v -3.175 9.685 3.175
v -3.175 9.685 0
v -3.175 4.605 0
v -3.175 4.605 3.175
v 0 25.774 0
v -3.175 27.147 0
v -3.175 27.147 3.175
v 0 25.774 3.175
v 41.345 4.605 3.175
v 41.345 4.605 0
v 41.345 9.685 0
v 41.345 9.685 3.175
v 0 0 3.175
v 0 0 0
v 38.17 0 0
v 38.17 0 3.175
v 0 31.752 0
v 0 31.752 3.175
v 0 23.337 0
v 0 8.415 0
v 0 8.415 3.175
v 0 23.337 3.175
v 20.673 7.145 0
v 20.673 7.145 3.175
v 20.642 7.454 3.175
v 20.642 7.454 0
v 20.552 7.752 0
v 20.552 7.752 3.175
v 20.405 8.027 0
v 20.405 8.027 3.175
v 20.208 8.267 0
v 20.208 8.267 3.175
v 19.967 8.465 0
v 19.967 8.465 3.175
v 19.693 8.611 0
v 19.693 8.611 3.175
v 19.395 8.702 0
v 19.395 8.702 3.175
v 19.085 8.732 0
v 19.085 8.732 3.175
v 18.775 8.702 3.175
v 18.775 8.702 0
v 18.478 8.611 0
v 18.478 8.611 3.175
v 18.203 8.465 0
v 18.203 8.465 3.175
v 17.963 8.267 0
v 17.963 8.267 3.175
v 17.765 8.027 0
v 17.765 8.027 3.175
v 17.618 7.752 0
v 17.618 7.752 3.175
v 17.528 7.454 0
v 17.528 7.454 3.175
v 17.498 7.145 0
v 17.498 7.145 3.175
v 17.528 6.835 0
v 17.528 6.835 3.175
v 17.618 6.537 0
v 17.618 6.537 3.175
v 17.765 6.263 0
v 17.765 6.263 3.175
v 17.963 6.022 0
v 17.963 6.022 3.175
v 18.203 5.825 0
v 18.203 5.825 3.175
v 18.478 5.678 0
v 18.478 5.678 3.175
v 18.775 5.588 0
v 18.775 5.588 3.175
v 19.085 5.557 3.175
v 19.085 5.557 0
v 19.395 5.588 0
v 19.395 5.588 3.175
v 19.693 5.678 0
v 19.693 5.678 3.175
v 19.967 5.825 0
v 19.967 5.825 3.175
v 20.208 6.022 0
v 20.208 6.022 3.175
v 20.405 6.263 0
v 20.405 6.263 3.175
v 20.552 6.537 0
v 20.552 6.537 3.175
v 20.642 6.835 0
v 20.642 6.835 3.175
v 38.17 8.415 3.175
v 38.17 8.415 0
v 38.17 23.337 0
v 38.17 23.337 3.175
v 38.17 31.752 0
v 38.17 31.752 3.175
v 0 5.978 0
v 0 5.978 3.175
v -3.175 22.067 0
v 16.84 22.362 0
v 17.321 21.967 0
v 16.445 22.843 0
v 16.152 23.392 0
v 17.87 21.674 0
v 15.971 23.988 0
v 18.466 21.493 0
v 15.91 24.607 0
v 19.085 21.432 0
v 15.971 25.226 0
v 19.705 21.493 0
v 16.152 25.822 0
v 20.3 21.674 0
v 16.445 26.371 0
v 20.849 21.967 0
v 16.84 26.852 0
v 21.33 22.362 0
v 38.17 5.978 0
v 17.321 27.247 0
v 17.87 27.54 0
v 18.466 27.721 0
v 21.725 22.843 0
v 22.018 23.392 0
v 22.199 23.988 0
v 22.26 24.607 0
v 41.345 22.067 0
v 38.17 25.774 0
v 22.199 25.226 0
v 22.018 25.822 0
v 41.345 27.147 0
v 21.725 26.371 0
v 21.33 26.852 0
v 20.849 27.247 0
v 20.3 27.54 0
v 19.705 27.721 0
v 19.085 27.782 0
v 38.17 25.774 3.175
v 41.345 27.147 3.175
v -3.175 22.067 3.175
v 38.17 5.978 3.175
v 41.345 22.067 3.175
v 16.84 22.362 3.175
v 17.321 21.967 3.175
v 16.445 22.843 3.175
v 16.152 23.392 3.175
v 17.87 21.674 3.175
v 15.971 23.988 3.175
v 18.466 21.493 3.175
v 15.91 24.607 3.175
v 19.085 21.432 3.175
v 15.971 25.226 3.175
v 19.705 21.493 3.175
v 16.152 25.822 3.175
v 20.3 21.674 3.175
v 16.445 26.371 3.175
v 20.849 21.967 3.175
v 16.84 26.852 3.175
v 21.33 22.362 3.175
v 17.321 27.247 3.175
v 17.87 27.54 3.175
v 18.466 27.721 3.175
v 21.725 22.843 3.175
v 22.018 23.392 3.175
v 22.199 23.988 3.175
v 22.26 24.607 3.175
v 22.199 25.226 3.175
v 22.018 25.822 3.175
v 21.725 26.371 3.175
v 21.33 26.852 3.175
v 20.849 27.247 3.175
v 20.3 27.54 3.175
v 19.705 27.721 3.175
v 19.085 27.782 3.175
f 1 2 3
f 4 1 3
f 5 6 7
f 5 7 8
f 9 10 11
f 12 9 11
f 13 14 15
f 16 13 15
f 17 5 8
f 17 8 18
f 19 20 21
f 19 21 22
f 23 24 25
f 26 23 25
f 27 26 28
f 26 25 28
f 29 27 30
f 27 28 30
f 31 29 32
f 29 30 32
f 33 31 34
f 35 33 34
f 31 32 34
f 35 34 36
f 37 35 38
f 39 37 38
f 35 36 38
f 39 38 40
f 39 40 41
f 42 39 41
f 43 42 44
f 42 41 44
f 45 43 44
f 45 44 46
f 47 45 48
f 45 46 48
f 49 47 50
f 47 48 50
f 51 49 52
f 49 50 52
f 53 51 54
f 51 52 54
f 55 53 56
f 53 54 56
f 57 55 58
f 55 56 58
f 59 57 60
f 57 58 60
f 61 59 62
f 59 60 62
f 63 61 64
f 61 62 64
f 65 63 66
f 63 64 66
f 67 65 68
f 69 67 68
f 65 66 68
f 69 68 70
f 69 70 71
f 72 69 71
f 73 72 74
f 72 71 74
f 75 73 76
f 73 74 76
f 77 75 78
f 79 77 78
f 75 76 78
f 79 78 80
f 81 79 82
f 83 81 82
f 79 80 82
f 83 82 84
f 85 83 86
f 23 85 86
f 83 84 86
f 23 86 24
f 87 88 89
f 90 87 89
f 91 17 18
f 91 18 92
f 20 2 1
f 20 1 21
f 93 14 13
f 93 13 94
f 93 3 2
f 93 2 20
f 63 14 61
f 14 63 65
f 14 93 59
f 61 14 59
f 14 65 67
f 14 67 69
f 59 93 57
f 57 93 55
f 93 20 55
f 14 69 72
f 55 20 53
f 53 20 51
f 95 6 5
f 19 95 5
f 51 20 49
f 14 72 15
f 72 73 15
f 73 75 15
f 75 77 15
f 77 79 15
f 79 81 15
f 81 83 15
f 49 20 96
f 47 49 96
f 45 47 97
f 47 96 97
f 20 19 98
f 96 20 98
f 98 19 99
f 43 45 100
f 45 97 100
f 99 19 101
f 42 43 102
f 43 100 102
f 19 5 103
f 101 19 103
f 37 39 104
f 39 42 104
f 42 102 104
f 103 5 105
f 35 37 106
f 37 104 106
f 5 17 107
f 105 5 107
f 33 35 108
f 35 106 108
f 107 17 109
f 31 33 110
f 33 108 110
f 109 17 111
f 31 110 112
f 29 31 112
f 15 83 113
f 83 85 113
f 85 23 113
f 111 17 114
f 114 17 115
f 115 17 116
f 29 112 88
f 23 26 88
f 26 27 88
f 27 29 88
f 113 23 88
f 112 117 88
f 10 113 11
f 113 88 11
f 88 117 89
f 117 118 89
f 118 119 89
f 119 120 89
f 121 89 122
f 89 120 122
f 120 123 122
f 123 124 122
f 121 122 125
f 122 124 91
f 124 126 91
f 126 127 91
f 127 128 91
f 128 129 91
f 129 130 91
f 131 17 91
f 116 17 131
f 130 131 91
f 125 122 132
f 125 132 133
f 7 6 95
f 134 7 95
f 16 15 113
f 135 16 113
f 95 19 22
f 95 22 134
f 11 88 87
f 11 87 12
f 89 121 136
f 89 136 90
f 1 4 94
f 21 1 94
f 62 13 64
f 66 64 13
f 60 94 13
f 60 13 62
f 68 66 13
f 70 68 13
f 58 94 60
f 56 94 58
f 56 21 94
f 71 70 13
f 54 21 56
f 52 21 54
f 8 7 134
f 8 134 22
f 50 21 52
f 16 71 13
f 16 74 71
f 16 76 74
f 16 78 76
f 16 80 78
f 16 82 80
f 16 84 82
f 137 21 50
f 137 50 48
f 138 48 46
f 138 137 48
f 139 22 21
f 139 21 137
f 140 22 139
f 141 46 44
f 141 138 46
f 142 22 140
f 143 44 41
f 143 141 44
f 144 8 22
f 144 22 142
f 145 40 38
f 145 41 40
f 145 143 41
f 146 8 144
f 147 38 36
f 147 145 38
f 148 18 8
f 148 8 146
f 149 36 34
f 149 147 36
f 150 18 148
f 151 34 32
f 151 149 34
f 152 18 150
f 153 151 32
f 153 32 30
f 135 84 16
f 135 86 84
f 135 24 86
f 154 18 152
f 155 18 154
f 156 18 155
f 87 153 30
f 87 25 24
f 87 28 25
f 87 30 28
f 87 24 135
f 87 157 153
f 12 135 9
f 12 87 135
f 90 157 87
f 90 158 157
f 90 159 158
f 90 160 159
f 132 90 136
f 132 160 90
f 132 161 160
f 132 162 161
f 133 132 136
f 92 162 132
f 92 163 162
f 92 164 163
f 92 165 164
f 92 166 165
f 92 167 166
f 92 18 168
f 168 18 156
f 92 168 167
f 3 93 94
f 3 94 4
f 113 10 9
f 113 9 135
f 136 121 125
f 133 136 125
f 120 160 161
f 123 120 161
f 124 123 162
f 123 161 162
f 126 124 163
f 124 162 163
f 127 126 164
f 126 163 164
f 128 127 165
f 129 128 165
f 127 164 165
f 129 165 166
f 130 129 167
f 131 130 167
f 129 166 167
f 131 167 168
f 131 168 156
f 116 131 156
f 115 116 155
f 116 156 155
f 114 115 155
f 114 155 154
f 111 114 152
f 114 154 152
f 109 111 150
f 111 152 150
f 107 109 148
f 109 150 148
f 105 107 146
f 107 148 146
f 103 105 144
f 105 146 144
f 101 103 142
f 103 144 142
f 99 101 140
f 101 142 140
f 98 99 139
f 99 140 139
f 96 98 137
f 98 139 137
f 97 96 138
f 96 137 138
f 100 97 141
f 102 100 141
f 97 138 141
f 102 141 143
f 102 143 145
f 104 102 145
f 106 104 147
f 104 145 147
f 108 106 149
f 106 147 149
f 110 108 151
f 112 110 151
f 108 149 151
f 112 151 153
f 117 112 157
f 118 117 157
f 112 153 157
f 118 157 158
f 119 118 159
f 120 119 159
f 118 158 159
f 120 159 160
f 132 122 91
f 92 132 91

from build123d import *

# Parameters (mm, degrees)
SKETCH1_W           = 38.170316933
SKETCH1_H           = 31.751666379
BOSS_EXTRUDE1_DEPTH = 3.175
SKETCH2_R           = 3.175
SKETCH2_R_2         = 1.5875
CUT_EXTRUDE1_DEPTH  = 3.175


with BuildPart() as part:
    # Sketch1 → Boss-Extrude1 (new body)
    with BuildSketch(Plane.XY):
        with Locations((19.085158467, 15.87583319)):
            Rectangle(SKETCH1_W, SKETCH1_H)
        Polygon((-3.175, 24.607083189), (-3.175, 27.147083189), (0, 25.774124793), (0, 23.337083189), (-3.175, 22.067083189), align=None)
        Polygon((-3.175, 7.144583189), (-3.175, 9.684583189), (0, 8.414583189), (0, 5.977541585), (-3.175, 4.604583189), align=None)
        Polygon((41.345316933, 7.144583189), (41.345316933, 4.604583189), (38.170316933, 5.977541585), (38.170316933, 8.414583189), (41.345316933, 9.684583189), align=None)
        Polygon((41.345316933, 24.607083189), (41.345316933, 22.067083189), (38.170316933, 23.337083189), (38.170316933, 25.774124793), (41.345316933, 27.147083189), align=None)
    extrude(amount=BOSS_EXTRUDE1_DEPTH)

    # Sketch2 → Cut-Extrude1 (cut)
    with BuildSketch(Plane.XY.offset(3.175)):
        with Locations((19.085158466, 24.607083189)):
            Circle(SKETCH2_R)
        with Locations((19.085158466, 7.144583189)):
            Circle(SKETCH2_R_2)
    extrude(amount=-CUT_EXTRUDE1_DEPTH, mode=Mode.SUBTRACT)


solid = part.part
